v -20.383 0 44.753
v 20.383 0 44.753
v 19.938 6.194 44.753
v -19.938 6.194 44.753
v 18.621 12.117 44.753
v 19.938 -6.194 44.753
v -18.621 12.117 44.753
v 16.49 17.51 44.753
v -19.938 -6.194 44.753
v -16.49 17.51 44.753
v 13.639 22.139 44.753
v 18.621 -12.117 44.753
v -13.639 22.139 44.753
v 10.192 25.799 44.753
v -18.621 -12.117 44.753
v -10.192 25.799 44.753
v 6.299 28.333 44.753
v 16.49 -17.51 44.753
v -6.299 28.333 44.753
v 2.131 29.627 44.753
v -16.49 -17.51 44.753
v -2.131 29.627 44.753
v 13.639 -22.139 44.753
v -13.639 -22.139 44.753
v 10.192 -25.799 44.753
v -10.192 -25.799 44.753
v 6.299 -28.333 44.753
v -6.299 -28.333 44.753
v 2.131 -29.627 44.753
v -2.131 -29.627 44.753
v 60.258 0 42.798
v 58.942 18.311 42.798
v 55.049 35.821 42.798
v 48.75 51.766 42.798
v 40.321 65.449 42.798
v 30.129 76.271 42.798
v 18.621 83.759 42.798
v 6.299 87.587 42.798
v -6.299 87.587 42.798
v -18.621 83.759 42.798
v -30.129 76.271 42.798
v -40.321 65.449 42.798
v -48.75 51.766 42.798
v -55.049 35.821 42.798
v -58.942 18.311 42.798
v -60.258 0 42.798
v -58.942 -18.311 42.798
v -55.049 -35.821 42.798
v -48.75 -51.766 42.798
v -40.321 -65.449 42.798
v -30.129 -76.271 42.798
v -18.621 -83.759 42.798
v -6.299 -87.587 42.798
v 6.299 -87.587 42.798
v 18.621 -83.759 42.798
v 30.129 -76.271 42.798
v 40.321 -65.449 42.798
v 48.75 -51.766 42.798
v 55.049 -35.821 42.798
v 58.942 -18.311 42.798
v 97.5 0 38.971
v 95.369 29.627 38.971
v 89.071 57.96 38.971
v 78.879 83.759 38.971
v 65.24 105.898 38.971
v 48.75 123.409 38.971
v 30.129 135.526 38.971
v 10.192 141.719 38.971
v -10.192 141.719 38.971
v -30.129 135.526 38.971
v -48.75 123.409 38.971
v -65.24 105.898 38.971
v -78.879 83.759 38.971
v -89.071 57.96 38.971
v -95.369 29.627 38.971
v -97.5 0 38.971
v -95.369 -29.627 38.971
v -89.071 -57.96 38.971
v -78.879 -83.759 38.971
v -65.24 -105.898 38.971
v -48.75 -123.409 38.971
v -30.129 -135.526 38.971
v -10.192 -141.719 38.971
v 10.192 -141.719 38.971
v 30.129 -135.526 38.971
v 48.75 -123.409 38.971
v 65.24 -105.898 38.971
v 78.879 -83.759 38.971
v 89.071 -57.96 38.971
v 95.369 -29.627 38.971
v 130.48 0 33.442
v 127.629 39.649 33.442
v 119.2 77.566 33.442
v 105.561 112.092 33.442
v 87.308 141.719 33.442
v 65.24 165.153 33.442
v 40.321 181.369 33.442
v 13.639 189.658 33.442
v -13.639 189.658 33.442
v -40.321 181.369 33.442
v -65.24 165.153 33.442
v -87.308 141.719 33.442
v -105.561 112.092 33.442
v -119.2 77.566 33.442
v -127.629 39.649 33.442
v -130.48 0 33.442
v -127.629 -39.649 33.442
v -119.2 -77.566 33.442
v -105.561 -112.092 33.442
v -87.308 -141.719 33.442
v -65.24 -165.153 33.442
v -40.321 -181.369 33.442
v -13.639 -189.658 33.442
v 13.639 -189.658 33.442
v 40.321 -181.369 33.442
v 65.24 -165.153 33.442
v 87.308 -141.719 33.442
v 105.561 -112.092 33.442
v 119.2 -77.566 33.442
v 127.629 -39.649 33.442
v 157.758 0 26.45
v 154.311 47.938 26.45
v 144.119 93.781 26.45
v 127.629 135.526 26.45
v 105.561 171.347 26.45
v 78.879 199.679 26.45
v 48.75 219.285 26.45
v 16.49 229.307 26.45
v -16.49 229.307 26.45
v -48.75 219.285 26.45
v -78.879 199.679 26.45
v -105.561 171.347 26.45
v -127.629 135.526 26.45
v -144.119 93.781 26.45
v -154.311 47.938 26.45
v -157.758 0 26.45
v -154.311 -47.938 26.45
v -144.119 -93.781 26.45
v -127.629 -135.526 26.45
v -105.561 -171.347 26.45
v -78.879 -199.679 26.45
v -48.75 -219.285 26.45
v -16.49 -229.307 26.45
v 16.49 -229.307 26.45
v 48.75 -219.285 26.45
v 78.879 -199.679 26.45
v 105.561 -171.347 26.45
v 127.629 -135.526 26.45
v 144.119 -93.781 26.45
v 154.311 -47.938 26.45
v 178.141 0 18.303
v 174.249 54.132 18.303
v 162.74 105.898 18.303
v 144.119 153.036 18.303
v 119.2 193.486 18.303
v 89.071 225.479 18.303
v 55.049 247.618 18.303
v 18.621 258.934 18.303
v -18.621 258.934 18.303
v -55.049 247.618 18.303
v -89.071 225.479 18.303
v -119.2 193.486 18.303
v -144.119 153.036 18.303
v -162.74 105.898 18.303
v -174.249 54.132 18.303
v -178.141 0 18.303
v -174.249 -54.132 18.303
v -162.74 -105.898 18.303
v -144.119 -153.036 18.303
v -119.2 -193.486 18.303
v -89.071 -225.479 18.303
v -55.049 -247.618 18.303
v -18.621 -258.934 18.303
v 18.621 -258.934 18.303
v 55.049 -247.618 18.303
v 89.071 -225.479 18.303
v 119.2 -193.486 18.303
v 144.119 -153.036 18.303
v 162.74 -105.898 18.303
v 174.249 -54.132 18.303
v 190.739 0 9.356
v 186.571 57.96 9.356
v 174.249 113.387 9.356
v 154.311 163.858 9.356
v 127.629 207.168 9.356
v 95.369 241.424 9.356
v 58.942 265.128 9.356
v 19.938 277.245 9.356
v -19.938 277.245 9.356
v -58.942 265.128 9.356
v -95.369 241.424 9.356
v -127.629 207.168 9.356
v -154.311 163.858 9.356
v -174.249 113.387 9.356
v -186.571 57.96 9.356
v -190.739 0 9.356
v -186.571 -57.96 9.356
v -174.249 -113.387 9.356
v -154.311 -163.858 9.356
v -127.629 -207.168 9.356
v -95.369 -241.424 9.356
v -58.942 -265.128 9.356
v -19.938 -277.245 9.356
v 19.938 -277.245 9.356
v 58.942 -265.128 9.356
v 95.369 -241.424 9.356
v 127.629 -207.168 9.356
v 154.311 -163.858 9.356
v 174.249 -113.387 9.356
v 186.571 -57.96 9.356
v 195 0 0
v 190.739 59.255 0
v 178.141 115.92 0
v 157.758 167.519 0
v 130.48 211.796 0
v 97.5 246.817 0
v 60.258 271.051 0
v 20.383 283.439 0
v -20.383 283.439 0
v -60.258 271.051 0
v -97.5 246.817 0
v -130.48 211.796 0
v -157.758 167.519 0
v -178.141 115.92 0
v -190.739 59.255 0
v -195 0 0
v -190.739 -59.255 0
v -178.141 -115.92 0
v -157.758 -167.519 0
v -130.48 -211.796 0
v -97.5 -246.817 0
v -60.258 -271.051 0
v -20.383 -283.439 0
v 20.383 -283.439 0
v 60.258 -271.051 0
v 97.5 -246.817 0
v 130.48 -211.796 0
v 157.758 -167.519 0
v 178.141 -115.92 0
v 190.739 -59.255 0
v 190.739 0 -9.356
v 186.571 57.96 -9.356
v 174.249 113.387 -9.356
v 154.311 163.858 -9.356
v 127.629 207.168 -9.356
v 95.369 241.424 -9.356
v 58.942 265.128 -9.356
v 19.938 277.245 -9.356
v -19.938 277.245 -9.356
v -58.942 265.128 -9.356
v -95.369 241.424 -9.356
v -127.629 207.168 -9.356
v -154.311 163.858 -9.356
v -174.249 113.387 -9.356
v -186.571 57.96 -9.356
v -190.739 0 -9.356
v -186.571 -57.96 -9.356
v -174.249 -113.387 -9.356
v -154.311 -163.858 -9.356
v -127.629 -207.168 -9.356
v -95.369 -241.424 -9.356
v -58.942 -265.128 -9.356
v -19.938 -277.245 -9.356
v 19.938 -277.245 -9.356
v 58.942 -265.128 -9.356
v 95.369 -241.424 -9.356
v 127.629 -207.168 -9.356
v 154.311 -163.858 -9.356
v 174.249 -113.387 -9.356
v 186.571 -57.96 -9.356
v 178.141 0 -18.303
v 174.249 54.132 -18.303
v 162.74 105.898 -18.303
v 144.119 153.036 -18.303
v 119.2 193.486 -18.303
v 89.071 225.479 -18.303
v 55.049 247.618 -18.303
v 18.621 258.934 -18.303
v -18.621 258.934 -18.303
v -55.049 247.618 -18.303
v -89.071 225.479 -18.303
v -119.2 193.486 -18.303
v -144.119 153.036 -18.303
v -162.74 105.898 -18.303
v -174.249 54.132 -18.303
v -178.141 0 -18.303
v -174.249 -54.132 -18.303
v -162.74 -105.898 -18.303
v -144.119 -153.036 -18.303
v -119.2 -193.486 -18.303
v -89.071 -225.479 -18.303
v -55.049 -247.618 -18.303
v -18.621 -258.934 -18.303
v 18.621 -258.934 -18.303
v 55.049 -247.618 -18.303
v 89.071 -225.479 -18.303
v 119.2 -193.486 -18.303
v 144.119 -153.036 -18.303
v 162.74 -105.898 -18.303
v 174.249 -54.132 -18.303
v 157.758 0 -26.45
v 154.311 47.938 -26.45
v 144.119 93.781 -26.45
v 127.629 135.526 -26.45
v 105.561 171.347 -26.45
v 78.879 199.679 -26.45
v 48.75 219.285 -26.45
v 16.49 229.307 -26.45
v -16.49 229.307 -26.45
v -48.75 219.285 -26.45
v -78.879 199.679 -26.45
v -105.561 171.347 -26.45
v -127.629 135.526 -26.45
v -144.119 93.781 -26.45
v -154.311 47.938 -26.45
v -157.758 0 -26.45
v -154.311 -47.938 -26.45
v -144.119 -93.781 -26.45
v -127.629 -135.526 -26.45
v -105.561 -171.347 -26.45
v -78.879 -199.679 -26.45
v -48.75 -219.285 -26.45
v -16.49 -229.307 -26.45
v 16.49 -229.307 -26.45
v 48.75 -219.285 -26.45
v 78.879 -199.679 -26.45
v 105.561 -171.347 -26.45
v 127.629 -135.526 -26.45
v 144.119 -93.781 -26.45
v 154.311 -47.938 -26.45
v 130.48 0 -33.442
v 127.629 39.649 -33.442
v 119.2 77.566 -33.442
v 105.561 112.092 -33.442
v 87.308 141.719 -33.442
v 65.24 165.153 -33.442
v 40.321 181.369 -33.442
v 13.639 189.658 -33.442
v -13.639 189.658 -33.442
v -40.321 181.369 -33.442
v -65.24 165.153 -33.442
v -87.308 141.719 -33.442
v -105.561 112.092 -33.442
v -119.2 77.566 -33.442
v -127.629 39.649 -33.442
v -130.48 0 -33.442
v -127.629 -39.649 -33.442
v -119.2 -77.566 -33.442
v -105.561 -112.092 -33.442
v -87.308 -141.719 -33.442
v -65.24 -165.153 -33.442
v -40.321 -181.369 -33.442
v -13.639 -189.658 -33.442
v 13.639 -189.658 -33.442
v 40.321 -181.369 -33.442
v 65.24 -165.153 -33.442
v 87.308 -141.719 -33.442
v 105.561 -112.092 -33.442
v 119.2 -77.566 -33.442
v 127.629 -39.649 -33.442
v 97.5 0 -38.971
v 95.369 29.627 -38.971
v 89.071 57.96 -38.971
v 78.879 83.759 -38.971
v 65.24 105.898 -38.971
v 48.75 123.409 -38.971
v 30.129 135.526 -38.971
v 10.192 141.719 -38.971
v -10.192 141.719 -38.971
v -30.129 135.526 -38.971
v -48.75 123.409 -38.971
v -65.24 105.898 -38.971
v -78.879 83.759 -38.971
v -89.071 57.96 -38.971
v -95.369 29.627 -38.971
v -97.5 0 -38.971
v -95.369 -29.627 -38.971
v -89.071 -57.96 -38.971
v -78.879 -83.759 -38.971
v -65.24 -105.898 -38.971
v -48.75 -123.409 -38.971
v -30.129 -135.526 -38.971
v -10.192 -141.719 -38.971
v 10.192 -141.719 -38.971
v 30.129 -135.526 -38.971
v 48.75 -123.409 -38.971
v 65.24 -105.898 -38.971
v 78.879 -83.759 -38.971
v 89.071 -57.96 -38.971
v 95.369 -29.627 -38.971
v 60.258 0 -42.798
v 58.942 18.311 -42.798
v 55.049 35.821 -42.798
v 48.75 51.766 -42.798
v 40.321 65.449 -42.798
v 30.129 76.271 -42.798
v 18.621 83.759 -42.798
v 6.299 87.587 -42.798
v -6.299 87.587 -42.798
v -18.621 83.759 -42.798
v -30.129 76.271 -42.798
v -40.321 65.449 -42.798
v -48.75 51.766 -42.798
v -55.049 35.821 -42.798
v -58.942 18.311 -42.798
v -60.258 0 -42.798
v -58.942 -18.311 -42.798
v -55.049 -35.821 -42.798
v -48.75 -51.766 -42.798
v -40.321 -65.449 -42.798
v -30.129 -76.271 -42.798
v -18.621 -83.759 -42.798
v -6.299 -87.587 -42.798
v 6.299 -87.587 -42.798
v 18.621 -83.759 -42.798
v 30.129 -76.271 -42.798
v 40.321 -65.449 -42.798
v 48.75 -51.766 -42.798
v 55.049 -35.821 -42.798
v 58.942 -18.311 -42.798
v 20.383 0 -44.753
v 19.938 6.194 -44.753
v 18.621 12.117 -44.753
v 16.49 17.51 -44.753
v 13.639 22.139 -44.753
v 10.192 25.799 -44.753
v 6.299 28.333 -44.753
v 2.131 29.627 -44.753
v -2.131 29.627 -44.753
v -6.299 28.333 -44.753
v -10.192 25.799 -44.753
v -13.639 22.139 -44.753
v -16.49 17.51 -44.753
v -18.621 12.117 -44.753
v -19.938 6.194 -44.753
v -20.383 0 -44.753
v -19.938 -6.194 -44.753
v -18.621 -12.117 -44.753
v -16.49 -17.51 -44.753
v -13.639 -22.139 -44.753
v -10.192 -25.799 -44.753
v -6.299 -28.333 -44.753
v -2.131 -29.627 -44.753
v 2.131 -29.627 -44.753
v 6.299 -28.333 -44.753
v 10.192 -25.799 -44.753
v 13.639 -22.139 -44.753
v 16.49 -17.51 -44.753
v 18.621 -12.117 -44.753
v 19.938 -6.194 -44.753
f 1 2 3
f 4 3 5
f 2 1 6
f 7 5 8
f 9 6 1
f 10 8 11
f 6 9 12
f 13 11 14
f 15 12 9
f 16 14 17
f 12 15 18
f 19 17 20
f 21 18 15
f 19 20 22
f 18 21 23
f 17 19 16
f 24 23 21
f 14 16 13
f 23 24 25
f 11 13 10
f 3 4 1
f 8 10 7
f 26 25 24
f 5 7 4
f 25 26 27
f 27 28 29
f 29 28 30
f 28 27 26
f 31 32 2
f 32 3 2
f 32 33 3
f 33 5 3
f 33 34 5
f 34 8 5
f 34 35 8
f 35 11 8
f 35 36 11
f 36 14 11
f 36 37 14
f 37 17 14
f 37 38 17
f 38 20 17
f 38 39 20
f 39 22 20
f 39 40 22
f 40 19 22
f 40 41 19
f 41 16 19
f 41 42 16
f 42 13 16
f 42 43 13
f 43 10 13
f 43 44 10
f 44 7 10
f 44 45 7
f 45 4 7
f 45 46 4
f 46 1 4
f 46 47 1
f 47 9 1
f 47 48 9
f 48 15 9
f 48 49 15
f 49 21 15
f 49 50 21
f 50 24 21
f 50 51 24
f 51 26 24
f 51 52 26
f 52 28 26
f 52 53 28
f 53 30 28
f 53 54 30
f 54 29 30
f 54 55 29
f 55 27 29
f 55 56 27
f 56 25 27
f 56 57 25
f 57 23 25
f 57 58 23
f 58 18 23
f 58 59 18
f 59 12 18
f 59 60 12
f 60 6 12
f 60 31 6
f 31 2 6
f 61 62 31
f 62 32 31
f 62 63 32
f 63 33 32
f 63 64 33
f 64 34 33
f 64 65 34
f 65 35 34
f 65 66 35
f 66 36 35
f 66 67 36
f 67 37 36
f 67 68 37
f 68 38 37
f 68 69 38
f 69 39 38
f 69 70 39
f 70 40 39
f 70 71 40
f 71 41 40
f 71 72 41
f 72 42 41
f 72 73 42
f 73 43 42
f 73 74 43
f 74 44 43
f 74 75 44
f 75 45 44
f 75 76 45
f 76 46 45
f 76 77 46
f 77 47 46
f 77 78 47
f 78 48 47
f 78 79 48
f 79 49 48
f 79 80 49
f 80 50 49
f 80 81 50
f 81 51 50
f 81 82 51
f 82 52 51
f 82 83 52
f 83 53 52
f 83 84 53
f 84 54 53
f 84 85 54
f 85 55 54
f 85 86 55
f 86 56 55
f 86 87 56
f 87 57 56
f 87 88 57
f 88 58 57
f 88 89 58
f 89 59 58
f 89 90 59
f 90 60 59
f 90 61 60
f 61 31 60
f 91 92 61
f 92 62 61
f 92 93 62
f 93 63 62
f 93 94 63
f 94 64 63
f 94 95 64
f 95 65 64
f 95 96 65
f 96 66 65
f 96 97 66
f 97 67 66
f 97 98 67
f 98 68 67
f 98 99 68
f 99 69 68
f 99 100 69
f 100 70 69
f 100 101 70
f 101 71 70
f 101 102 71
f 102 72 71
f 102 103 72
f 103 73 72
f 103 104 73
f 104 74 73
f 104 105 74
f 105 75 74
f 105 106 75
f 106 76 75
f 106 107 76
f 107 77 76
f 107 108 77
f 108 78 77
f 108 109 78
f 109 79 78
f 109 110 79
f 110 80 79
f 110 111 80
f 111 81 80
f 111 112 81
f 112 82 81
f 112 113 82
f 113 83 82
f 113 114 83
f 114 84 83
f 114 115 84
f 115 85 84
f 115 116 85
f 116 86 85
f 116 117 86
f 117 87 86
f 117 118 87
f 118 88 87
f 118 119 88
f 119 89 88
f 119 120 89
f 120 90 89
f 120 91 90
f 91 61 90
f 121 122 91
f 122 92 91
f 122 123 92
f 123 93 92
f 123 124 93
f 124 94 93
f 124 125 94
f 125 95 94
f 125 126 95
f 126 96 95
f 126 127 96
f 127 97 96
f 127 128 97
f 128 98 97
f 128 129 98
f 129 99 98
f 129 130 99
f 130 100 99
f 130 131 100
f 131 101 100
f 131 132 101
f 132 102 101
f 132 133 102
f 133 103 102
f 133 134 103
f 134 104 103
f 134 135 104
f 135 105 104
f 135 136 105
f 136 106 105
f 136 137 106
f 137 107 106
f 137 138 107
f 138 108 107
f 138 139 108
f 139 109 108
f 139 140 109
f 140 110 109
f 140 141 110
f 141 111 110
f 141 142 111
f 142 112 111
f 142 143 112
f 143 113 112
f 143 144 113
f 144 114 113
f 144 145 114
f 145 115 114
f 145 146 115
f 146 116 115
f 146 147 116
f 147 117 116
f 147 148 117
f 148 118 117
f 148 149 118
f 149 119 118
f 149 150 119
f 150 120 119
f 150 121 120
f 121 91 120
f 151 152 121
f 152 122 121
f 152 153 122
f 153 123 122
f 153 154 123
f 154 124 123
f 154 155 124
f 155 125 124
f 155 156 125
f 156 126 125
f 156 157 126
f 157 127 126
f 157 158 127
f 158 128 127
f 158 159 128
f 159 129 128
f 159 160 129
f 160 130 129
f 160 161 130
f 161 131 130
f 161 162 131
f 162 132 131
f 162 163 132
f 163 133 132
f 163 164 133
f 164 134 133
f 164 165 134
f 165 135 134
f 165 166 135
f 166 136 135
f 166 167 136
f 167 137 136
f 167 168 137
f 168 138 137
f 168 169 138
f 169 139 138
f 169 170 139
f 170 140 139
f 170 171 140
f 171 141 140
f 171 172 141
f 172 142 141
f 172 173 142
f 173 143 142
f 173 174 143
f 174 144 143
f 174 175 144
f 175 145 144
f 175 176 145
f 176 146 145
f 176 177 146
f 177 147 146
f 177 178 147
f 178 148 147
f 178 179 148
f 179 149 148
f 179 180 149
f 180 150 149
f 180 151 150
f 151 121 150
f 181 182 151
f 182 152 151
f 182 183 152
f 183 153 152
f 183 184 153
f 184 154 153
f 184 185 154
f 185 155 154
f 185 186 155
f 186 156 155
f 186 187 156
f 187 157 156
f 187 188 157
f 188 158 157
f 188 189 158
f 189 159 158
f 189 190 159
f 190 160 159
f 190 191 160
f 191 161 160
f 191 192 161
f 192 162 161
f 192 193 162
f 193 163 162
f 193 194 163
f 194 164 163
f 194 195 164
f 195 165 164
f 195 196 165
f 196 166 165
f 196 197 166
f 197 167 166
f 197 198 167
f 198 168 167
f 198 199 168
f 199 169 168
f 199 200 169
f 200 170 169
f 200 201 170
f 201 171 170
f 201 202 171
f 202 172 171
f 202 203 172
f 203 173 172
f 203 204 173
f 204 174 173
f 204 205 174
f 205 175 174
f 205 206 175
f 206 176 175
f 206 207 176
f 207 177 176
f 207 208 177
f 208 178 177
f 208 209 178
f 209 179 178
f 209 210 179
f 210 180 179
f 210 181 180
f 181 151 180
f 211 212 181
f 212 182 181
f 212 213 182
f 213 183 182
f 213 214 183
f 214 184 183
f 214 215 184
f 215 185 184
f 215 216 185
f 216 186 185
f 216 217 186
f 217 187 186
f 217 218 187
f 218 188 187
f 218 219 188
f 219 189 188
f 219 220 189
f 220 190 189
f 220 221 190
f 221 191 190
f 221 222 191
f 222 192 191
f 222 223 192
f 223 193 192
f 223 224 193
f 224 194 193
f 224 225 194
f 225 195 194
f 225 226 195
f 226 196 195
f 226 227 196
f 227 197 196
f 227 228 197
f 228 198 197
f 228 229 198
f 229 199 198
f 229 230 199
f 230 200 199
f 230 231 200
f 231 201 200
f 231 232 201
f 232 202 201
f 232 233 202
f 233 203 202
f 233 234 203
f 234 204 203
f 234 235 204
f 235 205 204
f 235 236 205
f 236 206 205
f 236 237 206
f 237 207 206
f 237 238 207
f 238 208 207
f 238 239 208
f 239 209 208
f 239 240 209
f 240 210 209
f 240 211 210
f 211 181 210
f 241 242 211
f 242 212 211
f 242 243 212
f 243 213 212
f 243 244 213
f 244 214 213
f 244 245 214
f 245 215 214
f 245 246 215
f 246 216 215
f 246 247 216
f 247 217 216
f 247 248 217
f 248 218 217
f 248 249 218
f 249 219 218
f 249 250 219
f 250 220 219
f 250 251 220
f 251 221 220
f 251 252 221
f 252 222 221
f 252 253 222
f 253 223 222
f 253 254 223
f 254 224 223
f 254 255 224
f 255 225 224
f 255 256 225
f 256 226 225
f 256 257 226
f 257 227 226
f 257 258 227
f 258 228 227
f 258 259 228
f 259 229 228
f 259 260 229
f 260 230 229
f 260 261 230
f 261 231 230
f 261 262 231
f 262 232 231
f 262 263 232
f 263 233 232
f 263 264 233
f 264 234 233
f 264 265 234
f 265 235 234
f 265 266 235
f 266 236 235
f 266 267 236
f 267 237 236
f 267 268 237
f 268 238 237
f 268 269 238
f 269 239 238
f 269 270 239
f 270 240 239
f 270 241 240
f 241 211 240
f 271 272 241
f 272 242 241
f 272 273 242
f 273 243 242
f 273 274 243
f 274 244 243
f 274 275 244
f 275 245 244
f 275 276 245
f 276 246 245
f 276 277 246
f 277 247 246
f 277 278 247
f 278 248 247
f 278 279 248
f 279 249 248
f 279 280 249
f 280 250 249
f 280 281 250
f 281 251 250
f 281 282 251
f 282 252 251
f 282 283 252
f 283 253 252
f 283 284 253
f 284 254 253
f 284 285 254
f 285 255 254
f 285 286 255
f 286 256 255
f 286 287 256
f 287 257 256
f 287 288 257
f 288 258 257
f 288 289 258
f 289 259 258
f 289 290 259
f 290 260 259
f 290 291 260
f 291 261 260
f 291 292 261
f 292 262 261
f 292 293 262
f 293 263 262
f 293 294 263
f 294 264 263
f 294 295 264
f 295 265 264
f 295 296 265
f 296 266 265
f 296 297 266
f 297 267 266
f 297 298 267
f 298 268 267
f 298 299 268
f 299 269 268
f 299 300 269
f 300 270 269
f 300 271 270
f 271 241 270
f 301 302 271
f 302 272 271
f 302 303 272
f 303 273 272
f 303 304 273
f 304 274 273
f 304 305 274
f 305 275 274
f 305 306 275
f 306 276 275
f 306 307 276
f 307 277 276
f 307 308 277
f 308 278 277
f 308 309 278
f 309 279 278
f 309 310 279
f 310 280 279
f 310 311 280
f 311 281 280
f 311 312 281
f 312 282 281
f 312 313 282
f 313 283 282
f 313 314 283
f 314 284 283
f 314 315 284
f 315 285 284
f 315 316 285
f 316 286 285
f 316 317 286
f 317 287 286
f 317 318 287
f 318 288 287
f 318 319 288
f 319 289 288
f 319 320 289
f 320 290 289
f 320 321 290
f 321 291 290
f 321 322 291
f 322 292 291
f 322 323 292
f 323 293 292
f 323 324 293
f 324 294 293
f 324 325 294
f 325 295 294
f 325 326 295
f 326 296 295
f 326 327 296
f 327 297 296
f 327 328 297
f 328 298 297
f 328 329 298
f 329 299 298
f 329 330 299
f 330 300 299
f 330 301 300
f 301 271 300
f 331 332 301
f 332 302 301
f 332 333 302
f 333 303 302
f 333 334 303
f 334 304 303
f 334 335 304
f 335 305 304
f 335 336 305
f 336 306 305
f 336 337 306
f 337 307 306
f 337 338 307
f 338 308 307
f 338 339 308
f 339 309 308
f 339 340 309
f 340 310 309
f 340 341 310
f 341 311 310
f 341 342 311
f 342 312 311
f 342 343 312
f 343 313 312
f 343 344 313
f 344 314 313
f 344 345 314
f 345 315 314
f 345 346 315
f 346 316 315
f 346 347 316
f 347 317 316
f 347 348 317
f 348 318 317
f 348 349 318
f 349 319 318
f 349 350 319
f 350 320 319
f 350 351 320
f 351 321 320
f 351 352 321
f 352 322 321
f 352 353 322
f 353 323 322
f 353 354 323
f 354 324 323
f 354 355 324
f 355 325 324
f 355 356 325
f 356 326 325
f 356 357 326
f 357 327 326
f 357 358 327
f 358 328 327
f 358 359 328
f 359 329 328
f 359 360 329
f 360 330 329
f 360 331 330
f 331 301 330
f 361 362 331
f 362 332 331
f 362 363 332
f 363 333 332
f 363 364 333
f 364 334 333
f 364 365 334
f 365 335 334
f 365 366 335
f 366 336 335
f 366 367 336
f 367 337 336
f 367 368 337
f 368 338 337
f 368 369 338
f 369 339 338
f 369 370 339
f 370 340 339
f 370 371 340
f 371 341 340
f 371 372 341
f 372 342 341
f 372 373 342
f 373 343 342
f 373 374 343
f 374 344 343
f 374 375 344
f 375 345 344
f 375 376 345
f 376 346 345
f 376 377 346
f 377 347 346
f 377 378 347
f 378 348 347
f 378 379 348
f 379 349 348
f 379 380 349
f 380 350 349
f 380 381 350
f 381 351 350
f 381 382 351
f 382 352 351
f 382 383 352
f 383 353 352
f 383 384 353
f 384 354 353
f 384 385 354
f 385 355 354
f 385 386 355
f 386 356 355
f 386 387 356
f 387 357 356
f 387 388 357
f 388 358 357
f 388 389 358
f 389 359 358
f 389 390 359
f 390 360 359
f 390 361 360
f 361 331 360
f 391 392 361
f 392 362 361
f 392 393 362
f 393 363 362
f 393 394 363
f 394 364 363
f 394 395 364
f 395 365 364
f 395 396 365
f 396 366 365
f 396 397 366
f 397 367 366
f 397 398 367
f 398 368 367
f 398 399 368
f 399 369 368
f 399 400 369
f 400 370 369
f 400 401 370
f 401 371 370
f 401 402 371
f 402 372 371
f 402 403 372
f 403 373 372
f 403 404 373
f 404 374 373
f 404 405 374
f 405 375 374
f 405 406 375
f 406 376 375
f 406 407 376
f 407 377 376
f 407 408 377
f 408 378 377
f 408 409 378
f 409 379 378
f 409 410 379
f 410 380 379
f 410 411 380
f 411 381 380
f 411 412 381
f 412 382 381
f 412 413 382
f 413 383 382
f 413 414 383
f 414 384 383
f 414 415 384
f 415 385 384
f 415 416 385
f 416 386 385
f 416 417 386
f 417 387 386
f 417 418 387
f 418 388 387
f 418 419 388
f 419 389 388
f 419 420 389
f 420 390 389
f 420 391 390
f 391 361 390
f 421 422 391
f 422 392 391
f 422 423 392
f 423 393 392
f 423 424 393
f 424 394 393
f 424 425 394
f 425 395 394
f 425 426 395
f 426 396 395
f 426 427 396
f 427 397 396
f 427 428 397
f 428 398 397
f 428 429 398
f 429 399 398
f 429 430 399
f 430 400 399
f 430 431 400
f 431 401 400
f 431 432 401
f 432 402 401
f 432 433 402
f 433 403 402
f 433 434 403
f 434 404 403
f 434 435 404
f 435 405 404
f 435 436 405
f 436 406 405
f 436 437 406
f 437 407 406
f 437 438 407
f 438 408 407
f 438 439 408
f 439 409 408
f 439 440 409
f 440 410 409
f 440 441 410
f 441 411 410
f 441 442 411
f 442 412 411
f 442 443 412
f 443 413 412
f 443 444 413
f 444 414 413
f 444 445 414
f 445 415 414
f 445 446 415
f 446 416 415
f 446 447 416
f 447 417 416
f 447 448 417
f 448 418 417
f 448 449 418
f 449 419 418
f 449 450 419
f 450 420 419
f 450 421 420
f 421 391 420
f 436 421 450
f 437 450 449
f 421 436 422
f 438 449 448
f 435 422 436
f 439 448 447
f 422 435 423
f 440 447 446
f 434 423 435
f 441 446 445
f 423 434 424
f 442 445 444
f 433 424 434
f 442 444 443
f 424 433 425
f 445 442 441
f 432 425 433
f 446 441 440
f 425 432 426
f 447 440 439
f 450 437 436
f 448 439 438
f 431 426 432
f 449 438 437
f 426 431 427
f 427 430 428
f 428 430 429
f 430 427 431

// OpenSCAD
// Generated by SolidPython 1.0.1 on 2020-07-29 00:46:51


scale(v = [13, 19, 3]) {
	sphere(r = 15);
}
/***********************************************
*********      SolidPython code:      **********
************************************************
 
# import packages: SolidPython
from solid import *
from solid.utils import *
from itertools import chain, combinations, permutations


class Resize:

    def __init__(self, scad_file):
        self.scad_file = scad_file
        #self.scad_file = import_scad(scad_file)
        # cone/cylinder param:
        self.r1 = 0
        self.r2 = 0
        self.h = 0
        # rectangular prism param:
        self.w = 0
        self.l = 0
        # ellipse param:
        self.r = 0

    # import OpenScad code (file name corresponds to shape)


    # classify shape + parameters
    def assign(self, param1, param2, param3):
        if self.scad_file == 'cone.scad':
            self.r1 = param1
            self.r2 = param2
            self.h = param3
        elif self.scad_file == 'cylinder.scad':
            self.r1 = param1
            self.r2 = param2
            self.h = param3
        elif self.scad_file == 'rectangularPrism.scad':
            self.h = param1
            self.l = param2
            self.w = param3
        else:
            self.r = param1
            self.h = param2

    # resize parameters
    def iterate(self):
        x = range(3, 20, 2)
        i = 1
        if self.scad_file == 'cone.scad':
            tempList = list(permutations(x, 2))
            for temp in tempList:
                param1 = temp[0]
                param2 = temp[1]
                filepath = 'produced_scad_files/' + 'cone' + str(param1) + '_' + str(param2) + '_' + '.scad'
                scad_render_to_file(cylinder(h=param1, r1=param2, r2=0), filepath)

        elif self.scad_file == 'cylinder.scad':
            tempList = list(permutations(x, 3))
            for temp in tempList:
                param1 = temp[0]
                param2 = temp[1]
                filepath = 'produced_scad_files/' + 'cylinder' + str(param1) + '_' + str(param2) + '_' + '.scad'
                scad_render_to_file(cylinder(h=param1, r1=param2, r2=param2), filepath)

        elif self.scad_file == 'rectangularPrism.scad':
            tempList = list(permutations(x, 3))
            for temp in tempList:
                param1 = temp[0]
                param2 = temp[1]
                param3 = temp[2]
                filepath = 'produced_scad_files/' + 'rectangularPrism' + str(param1) + '_' + str(param2) + '_' + str(
                    param3) + '.scad'
                scad_render_to_file(cube(size=(param1, param2, param3)), filepath)

        elif self.scad_file == 'ellipse.scad':
            tempList = list(permutations(x, 4))
            for temp in tempList:
                param1 = temp[0]
                param2 = temp[1]
                param3 = temp[2]
                param4 = temp[3]
                filepath = 'produced_scad_files/' + 'ellipse' + str(param1) + '_' + str(param2) + '_' + str(param3) + '_' + str(param4) + '.scad'
                scad_render_to_file(scale([param1, param2, param3])(sphere(r=param4)), filepath)

    def render_to_scadfile(self):
        scad_render_to_file(scad, 'example.scad') 
 
************************************************/
